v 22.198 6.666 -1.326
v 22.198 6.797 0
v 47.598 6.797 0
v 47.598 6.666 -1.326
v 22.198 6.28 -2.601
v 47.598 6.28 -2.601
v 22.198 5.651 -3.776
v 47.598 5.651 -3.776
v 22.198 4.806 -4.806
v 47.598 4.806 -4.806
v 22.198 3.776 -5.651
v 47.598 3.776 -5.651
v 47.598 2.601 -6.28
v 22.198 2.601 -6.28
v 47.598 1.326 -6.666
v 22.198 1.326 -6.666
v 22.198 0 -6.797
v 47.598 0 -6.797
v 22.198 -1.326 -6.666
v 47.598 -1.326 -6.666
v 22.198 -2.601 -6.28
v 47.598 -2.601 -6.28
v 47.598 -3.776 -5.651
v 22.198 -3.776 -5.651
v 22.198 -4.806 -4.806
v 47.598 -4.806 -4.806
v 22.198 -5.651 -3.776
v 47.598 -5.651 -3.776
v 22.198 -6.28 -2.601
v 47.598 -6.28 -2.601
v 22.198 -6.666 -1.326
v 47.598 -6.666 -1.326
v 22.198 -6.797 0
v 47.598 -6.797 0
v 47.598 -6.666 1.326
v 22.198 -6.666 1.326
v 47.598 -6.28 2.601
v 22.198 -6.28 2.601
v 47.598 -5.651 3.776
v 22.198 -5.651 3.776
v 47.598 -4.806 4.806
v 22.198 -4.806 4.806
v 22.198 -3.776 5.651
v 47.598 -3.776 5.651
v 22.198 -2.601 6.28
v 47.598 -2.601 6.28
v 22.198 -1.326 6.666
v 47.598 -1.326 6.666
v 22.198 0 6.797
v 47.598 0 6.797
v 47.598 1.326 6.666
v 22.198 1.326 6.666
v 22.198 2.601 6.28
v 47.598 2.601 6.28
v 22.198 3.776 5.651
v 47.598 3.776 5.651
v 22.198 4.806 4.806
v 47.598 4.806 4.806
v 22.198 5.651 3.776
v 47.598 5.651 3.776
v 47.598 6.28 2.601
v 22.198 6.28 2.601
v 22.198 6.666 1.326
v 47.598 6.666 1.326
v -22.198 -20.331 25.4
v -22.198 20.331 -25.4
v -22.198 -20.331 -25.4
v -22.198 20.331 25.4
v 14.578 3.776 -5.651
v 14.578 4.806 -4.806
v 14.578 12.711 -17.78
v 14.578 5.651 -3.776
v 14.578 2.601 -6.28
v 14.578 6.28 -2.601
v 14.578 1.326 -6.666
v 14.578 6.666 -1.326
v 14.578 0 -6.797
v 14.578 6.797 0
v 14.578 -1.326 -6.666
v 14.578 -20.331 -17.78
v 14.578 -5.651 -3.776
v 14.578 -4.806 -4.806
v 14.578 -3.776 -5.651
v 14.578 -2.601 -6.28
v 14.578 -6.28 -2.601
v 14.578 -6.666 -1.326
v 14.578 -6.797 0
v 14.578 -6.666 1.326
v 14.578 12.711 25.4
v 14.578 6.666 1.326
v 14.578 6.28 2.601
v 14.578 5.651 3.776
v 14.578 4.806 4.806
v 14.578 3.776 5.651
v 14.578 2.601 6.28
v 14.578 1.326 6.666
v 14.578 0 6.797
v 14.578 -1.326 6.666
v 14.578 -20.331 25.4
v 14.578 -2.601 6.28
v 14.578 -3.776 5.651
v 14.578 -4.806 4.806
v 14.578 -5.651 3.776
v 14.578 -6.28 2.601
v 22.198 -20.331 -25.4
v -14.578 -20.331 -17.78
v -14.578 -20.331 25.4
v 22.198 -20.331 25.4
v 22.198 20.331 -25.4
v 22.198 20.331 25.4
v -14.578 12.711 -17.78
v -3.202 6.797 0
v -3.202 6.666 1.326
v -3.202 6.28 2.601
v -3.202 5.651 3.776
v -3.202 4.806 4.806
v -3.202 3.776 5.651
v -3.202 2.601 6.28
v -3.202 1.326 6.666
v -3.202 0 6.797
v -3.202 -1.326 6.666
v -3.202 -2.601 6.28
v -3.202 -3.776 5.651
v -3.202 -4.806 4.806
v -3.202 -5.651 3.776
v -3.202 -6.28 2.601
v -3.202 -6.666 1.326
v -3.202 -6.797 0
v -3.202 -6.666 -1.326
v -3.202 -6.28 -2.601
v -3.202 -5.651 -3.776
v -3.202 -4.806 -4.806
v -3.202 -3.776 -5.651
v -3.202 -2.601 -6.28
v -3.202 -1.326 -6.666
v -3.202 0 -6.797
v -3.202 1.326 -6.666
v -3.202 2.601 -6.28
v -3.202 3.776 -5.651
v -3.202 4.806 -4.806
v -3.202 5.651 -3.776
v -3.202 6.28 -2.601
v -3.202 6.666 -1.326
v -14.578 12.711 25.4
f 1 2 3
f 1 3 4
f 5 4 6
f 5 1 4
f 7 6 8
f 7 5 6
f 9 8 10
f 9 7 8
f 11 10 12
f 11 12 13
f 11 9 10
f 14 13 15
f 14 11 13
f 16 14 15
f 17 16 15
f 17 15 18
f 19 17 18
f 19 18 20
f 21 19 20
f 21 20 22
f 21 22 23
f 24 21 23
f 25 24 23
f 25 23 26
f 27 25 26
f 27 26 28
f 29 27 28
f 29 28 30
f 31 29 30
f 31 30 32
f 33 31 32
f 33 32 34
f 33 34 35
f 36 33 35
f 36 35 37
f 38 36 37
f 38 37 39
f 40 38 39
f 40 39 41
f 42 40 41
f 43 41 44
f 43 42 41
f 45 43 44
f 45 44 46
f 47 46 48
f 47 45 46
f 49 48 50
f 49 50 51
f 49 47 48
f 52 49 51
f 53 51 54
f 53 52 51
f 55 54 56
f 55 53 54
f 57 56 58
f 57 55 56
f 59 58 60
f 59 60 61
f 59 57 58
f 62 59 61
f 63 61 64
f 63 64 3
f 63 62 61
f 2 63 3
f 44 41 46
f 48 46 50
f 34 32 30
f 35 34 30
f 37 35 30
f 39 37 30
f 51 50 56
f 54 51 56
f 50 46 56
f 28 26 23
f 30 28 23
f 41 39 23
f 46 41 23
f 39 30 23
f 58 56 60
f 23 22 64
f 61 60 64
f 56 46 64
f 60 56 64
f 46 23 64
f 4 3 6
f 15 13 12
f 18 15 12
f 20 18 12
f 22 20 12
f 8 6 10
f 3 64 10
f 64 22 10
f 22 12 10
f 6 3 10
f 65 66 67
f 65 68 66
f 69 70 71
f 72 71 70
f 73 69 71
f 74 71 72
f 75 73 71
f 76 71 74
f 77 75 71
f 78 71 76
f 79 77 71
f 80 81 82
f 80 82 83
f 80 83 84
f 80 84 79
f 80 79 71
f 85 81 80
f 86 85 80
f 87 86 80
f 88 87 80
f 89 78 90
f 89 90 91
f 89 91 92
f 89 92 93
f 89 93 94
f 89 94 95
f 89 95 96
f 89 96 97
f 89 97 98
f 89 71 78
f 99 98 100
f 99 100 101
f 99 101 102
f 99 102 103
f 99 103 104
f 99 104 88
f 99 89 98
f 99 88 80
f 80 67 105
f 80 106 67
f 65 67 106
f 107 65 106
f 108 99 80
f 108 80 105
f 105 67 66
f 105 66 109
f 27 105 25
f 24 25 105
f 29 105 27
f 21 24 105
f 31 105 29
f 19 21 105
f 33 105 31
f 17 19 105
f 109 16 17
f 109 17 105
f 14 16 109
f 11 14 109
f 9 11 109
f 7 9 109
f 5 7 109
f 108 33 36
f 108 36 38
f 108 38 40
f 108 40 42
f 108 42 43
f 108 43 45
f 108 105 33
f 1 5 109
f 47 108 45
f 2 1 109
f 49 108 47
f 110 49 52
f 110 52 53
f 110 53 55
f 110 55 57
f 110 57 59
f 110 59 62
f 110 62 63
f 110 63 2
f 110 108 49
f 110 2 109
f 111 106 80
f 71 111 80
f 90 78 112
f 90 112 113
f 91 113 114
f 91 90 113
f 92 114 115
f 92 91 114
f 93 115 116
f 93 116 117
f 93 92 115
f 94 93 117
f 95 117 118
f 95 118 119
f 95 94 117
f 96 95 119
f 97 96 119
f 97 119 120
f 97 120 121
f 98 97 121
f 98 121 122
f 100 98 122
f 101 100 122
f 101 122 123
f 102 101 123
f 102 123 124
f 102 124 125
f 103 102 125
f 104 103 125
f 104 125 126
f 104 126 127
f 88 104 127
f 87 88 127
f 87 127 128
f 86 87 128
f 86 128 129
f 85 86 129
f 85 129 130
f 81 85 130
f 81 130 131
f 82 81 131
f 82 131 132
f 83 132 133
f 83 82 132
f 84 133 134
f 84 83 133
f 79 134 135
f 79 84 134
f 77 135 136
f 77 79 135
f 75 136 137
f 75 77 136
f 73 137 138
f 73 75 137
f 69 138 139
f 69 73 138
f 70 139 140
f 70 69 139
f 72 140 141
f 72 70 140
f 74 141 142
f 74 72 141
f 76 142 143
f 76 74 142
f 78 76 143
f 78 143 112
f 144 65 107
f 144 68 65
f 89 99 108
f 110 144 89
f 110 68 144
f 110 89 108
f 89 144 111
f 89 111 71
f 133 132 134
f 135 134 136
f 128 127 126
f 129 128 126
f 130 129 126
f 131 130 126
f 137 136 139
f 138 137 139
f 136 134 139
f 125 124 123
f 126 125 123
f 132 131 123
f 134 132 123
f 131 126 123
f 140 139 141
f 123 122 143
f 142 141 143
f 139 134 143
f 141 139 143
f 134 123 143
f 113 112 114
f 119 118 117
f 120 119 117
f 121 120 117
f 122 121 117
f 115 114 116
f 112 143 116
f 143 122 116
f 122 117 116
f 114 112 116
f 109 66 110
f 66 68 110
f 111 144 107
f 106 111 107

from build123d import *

# Parameters (mm, degrees)
F0_W      = 44.395774
F0_H      = 40.661618
F1_DEPTH  = 25.4
F1_FACE_W = 44.395774
F1_FACE_H = 40.661618
F2_DEPTH  = 25.4
F3_T      = -7.62
F4_R      = 6.796933
F5_DEPTH  = 25.4
F5_FACE_R = 6.796933
F6_DEPTH  = 50.8


with BuildPart() as f1:
    # F0 (on Top) → F1 (new body)
    with BuildSketch(Plane.XY):
        Rectangle(F0_W, F0_H)
    extrude(amount=F1_DEPTH)

    # F1_face (on face) → F2 (join)
    with BuildSketch(Plane(origin=(0, 0, 0), x_dir=(1, 0, 0), z_dir=(0, 0, -1))):
        Rectangle(F1_FACE_W, F1_FACE_H)
    extrude(amount=F2_DEPTH)

    # F3
    f3_openings = [f1.faces().sort_by_distance(p)[0] for p in [
        (0, -20.330809, 0),
        (0, 0, 25.4),
    ]]
    offset(amount=F3_T, openings=f3_openings)

    # F4 (on face) → F5 (join)
    with BuildSketch(Plane.YZ.offset(22.197887)):
        Circle(F4_R)
    extrude(amount=-F5_DEPTH)

    # F5_face (on face) → F6 (join)
    with BuildSketch(Plane(origin=(-3.202113, 0, 0), x_dir=(0, 1, 0), z_dir=(-1, 0, 0))):
        Circle(F5_FACE_R)
    extrude(amount=-F6_DEPTH)


solid = f1.part
